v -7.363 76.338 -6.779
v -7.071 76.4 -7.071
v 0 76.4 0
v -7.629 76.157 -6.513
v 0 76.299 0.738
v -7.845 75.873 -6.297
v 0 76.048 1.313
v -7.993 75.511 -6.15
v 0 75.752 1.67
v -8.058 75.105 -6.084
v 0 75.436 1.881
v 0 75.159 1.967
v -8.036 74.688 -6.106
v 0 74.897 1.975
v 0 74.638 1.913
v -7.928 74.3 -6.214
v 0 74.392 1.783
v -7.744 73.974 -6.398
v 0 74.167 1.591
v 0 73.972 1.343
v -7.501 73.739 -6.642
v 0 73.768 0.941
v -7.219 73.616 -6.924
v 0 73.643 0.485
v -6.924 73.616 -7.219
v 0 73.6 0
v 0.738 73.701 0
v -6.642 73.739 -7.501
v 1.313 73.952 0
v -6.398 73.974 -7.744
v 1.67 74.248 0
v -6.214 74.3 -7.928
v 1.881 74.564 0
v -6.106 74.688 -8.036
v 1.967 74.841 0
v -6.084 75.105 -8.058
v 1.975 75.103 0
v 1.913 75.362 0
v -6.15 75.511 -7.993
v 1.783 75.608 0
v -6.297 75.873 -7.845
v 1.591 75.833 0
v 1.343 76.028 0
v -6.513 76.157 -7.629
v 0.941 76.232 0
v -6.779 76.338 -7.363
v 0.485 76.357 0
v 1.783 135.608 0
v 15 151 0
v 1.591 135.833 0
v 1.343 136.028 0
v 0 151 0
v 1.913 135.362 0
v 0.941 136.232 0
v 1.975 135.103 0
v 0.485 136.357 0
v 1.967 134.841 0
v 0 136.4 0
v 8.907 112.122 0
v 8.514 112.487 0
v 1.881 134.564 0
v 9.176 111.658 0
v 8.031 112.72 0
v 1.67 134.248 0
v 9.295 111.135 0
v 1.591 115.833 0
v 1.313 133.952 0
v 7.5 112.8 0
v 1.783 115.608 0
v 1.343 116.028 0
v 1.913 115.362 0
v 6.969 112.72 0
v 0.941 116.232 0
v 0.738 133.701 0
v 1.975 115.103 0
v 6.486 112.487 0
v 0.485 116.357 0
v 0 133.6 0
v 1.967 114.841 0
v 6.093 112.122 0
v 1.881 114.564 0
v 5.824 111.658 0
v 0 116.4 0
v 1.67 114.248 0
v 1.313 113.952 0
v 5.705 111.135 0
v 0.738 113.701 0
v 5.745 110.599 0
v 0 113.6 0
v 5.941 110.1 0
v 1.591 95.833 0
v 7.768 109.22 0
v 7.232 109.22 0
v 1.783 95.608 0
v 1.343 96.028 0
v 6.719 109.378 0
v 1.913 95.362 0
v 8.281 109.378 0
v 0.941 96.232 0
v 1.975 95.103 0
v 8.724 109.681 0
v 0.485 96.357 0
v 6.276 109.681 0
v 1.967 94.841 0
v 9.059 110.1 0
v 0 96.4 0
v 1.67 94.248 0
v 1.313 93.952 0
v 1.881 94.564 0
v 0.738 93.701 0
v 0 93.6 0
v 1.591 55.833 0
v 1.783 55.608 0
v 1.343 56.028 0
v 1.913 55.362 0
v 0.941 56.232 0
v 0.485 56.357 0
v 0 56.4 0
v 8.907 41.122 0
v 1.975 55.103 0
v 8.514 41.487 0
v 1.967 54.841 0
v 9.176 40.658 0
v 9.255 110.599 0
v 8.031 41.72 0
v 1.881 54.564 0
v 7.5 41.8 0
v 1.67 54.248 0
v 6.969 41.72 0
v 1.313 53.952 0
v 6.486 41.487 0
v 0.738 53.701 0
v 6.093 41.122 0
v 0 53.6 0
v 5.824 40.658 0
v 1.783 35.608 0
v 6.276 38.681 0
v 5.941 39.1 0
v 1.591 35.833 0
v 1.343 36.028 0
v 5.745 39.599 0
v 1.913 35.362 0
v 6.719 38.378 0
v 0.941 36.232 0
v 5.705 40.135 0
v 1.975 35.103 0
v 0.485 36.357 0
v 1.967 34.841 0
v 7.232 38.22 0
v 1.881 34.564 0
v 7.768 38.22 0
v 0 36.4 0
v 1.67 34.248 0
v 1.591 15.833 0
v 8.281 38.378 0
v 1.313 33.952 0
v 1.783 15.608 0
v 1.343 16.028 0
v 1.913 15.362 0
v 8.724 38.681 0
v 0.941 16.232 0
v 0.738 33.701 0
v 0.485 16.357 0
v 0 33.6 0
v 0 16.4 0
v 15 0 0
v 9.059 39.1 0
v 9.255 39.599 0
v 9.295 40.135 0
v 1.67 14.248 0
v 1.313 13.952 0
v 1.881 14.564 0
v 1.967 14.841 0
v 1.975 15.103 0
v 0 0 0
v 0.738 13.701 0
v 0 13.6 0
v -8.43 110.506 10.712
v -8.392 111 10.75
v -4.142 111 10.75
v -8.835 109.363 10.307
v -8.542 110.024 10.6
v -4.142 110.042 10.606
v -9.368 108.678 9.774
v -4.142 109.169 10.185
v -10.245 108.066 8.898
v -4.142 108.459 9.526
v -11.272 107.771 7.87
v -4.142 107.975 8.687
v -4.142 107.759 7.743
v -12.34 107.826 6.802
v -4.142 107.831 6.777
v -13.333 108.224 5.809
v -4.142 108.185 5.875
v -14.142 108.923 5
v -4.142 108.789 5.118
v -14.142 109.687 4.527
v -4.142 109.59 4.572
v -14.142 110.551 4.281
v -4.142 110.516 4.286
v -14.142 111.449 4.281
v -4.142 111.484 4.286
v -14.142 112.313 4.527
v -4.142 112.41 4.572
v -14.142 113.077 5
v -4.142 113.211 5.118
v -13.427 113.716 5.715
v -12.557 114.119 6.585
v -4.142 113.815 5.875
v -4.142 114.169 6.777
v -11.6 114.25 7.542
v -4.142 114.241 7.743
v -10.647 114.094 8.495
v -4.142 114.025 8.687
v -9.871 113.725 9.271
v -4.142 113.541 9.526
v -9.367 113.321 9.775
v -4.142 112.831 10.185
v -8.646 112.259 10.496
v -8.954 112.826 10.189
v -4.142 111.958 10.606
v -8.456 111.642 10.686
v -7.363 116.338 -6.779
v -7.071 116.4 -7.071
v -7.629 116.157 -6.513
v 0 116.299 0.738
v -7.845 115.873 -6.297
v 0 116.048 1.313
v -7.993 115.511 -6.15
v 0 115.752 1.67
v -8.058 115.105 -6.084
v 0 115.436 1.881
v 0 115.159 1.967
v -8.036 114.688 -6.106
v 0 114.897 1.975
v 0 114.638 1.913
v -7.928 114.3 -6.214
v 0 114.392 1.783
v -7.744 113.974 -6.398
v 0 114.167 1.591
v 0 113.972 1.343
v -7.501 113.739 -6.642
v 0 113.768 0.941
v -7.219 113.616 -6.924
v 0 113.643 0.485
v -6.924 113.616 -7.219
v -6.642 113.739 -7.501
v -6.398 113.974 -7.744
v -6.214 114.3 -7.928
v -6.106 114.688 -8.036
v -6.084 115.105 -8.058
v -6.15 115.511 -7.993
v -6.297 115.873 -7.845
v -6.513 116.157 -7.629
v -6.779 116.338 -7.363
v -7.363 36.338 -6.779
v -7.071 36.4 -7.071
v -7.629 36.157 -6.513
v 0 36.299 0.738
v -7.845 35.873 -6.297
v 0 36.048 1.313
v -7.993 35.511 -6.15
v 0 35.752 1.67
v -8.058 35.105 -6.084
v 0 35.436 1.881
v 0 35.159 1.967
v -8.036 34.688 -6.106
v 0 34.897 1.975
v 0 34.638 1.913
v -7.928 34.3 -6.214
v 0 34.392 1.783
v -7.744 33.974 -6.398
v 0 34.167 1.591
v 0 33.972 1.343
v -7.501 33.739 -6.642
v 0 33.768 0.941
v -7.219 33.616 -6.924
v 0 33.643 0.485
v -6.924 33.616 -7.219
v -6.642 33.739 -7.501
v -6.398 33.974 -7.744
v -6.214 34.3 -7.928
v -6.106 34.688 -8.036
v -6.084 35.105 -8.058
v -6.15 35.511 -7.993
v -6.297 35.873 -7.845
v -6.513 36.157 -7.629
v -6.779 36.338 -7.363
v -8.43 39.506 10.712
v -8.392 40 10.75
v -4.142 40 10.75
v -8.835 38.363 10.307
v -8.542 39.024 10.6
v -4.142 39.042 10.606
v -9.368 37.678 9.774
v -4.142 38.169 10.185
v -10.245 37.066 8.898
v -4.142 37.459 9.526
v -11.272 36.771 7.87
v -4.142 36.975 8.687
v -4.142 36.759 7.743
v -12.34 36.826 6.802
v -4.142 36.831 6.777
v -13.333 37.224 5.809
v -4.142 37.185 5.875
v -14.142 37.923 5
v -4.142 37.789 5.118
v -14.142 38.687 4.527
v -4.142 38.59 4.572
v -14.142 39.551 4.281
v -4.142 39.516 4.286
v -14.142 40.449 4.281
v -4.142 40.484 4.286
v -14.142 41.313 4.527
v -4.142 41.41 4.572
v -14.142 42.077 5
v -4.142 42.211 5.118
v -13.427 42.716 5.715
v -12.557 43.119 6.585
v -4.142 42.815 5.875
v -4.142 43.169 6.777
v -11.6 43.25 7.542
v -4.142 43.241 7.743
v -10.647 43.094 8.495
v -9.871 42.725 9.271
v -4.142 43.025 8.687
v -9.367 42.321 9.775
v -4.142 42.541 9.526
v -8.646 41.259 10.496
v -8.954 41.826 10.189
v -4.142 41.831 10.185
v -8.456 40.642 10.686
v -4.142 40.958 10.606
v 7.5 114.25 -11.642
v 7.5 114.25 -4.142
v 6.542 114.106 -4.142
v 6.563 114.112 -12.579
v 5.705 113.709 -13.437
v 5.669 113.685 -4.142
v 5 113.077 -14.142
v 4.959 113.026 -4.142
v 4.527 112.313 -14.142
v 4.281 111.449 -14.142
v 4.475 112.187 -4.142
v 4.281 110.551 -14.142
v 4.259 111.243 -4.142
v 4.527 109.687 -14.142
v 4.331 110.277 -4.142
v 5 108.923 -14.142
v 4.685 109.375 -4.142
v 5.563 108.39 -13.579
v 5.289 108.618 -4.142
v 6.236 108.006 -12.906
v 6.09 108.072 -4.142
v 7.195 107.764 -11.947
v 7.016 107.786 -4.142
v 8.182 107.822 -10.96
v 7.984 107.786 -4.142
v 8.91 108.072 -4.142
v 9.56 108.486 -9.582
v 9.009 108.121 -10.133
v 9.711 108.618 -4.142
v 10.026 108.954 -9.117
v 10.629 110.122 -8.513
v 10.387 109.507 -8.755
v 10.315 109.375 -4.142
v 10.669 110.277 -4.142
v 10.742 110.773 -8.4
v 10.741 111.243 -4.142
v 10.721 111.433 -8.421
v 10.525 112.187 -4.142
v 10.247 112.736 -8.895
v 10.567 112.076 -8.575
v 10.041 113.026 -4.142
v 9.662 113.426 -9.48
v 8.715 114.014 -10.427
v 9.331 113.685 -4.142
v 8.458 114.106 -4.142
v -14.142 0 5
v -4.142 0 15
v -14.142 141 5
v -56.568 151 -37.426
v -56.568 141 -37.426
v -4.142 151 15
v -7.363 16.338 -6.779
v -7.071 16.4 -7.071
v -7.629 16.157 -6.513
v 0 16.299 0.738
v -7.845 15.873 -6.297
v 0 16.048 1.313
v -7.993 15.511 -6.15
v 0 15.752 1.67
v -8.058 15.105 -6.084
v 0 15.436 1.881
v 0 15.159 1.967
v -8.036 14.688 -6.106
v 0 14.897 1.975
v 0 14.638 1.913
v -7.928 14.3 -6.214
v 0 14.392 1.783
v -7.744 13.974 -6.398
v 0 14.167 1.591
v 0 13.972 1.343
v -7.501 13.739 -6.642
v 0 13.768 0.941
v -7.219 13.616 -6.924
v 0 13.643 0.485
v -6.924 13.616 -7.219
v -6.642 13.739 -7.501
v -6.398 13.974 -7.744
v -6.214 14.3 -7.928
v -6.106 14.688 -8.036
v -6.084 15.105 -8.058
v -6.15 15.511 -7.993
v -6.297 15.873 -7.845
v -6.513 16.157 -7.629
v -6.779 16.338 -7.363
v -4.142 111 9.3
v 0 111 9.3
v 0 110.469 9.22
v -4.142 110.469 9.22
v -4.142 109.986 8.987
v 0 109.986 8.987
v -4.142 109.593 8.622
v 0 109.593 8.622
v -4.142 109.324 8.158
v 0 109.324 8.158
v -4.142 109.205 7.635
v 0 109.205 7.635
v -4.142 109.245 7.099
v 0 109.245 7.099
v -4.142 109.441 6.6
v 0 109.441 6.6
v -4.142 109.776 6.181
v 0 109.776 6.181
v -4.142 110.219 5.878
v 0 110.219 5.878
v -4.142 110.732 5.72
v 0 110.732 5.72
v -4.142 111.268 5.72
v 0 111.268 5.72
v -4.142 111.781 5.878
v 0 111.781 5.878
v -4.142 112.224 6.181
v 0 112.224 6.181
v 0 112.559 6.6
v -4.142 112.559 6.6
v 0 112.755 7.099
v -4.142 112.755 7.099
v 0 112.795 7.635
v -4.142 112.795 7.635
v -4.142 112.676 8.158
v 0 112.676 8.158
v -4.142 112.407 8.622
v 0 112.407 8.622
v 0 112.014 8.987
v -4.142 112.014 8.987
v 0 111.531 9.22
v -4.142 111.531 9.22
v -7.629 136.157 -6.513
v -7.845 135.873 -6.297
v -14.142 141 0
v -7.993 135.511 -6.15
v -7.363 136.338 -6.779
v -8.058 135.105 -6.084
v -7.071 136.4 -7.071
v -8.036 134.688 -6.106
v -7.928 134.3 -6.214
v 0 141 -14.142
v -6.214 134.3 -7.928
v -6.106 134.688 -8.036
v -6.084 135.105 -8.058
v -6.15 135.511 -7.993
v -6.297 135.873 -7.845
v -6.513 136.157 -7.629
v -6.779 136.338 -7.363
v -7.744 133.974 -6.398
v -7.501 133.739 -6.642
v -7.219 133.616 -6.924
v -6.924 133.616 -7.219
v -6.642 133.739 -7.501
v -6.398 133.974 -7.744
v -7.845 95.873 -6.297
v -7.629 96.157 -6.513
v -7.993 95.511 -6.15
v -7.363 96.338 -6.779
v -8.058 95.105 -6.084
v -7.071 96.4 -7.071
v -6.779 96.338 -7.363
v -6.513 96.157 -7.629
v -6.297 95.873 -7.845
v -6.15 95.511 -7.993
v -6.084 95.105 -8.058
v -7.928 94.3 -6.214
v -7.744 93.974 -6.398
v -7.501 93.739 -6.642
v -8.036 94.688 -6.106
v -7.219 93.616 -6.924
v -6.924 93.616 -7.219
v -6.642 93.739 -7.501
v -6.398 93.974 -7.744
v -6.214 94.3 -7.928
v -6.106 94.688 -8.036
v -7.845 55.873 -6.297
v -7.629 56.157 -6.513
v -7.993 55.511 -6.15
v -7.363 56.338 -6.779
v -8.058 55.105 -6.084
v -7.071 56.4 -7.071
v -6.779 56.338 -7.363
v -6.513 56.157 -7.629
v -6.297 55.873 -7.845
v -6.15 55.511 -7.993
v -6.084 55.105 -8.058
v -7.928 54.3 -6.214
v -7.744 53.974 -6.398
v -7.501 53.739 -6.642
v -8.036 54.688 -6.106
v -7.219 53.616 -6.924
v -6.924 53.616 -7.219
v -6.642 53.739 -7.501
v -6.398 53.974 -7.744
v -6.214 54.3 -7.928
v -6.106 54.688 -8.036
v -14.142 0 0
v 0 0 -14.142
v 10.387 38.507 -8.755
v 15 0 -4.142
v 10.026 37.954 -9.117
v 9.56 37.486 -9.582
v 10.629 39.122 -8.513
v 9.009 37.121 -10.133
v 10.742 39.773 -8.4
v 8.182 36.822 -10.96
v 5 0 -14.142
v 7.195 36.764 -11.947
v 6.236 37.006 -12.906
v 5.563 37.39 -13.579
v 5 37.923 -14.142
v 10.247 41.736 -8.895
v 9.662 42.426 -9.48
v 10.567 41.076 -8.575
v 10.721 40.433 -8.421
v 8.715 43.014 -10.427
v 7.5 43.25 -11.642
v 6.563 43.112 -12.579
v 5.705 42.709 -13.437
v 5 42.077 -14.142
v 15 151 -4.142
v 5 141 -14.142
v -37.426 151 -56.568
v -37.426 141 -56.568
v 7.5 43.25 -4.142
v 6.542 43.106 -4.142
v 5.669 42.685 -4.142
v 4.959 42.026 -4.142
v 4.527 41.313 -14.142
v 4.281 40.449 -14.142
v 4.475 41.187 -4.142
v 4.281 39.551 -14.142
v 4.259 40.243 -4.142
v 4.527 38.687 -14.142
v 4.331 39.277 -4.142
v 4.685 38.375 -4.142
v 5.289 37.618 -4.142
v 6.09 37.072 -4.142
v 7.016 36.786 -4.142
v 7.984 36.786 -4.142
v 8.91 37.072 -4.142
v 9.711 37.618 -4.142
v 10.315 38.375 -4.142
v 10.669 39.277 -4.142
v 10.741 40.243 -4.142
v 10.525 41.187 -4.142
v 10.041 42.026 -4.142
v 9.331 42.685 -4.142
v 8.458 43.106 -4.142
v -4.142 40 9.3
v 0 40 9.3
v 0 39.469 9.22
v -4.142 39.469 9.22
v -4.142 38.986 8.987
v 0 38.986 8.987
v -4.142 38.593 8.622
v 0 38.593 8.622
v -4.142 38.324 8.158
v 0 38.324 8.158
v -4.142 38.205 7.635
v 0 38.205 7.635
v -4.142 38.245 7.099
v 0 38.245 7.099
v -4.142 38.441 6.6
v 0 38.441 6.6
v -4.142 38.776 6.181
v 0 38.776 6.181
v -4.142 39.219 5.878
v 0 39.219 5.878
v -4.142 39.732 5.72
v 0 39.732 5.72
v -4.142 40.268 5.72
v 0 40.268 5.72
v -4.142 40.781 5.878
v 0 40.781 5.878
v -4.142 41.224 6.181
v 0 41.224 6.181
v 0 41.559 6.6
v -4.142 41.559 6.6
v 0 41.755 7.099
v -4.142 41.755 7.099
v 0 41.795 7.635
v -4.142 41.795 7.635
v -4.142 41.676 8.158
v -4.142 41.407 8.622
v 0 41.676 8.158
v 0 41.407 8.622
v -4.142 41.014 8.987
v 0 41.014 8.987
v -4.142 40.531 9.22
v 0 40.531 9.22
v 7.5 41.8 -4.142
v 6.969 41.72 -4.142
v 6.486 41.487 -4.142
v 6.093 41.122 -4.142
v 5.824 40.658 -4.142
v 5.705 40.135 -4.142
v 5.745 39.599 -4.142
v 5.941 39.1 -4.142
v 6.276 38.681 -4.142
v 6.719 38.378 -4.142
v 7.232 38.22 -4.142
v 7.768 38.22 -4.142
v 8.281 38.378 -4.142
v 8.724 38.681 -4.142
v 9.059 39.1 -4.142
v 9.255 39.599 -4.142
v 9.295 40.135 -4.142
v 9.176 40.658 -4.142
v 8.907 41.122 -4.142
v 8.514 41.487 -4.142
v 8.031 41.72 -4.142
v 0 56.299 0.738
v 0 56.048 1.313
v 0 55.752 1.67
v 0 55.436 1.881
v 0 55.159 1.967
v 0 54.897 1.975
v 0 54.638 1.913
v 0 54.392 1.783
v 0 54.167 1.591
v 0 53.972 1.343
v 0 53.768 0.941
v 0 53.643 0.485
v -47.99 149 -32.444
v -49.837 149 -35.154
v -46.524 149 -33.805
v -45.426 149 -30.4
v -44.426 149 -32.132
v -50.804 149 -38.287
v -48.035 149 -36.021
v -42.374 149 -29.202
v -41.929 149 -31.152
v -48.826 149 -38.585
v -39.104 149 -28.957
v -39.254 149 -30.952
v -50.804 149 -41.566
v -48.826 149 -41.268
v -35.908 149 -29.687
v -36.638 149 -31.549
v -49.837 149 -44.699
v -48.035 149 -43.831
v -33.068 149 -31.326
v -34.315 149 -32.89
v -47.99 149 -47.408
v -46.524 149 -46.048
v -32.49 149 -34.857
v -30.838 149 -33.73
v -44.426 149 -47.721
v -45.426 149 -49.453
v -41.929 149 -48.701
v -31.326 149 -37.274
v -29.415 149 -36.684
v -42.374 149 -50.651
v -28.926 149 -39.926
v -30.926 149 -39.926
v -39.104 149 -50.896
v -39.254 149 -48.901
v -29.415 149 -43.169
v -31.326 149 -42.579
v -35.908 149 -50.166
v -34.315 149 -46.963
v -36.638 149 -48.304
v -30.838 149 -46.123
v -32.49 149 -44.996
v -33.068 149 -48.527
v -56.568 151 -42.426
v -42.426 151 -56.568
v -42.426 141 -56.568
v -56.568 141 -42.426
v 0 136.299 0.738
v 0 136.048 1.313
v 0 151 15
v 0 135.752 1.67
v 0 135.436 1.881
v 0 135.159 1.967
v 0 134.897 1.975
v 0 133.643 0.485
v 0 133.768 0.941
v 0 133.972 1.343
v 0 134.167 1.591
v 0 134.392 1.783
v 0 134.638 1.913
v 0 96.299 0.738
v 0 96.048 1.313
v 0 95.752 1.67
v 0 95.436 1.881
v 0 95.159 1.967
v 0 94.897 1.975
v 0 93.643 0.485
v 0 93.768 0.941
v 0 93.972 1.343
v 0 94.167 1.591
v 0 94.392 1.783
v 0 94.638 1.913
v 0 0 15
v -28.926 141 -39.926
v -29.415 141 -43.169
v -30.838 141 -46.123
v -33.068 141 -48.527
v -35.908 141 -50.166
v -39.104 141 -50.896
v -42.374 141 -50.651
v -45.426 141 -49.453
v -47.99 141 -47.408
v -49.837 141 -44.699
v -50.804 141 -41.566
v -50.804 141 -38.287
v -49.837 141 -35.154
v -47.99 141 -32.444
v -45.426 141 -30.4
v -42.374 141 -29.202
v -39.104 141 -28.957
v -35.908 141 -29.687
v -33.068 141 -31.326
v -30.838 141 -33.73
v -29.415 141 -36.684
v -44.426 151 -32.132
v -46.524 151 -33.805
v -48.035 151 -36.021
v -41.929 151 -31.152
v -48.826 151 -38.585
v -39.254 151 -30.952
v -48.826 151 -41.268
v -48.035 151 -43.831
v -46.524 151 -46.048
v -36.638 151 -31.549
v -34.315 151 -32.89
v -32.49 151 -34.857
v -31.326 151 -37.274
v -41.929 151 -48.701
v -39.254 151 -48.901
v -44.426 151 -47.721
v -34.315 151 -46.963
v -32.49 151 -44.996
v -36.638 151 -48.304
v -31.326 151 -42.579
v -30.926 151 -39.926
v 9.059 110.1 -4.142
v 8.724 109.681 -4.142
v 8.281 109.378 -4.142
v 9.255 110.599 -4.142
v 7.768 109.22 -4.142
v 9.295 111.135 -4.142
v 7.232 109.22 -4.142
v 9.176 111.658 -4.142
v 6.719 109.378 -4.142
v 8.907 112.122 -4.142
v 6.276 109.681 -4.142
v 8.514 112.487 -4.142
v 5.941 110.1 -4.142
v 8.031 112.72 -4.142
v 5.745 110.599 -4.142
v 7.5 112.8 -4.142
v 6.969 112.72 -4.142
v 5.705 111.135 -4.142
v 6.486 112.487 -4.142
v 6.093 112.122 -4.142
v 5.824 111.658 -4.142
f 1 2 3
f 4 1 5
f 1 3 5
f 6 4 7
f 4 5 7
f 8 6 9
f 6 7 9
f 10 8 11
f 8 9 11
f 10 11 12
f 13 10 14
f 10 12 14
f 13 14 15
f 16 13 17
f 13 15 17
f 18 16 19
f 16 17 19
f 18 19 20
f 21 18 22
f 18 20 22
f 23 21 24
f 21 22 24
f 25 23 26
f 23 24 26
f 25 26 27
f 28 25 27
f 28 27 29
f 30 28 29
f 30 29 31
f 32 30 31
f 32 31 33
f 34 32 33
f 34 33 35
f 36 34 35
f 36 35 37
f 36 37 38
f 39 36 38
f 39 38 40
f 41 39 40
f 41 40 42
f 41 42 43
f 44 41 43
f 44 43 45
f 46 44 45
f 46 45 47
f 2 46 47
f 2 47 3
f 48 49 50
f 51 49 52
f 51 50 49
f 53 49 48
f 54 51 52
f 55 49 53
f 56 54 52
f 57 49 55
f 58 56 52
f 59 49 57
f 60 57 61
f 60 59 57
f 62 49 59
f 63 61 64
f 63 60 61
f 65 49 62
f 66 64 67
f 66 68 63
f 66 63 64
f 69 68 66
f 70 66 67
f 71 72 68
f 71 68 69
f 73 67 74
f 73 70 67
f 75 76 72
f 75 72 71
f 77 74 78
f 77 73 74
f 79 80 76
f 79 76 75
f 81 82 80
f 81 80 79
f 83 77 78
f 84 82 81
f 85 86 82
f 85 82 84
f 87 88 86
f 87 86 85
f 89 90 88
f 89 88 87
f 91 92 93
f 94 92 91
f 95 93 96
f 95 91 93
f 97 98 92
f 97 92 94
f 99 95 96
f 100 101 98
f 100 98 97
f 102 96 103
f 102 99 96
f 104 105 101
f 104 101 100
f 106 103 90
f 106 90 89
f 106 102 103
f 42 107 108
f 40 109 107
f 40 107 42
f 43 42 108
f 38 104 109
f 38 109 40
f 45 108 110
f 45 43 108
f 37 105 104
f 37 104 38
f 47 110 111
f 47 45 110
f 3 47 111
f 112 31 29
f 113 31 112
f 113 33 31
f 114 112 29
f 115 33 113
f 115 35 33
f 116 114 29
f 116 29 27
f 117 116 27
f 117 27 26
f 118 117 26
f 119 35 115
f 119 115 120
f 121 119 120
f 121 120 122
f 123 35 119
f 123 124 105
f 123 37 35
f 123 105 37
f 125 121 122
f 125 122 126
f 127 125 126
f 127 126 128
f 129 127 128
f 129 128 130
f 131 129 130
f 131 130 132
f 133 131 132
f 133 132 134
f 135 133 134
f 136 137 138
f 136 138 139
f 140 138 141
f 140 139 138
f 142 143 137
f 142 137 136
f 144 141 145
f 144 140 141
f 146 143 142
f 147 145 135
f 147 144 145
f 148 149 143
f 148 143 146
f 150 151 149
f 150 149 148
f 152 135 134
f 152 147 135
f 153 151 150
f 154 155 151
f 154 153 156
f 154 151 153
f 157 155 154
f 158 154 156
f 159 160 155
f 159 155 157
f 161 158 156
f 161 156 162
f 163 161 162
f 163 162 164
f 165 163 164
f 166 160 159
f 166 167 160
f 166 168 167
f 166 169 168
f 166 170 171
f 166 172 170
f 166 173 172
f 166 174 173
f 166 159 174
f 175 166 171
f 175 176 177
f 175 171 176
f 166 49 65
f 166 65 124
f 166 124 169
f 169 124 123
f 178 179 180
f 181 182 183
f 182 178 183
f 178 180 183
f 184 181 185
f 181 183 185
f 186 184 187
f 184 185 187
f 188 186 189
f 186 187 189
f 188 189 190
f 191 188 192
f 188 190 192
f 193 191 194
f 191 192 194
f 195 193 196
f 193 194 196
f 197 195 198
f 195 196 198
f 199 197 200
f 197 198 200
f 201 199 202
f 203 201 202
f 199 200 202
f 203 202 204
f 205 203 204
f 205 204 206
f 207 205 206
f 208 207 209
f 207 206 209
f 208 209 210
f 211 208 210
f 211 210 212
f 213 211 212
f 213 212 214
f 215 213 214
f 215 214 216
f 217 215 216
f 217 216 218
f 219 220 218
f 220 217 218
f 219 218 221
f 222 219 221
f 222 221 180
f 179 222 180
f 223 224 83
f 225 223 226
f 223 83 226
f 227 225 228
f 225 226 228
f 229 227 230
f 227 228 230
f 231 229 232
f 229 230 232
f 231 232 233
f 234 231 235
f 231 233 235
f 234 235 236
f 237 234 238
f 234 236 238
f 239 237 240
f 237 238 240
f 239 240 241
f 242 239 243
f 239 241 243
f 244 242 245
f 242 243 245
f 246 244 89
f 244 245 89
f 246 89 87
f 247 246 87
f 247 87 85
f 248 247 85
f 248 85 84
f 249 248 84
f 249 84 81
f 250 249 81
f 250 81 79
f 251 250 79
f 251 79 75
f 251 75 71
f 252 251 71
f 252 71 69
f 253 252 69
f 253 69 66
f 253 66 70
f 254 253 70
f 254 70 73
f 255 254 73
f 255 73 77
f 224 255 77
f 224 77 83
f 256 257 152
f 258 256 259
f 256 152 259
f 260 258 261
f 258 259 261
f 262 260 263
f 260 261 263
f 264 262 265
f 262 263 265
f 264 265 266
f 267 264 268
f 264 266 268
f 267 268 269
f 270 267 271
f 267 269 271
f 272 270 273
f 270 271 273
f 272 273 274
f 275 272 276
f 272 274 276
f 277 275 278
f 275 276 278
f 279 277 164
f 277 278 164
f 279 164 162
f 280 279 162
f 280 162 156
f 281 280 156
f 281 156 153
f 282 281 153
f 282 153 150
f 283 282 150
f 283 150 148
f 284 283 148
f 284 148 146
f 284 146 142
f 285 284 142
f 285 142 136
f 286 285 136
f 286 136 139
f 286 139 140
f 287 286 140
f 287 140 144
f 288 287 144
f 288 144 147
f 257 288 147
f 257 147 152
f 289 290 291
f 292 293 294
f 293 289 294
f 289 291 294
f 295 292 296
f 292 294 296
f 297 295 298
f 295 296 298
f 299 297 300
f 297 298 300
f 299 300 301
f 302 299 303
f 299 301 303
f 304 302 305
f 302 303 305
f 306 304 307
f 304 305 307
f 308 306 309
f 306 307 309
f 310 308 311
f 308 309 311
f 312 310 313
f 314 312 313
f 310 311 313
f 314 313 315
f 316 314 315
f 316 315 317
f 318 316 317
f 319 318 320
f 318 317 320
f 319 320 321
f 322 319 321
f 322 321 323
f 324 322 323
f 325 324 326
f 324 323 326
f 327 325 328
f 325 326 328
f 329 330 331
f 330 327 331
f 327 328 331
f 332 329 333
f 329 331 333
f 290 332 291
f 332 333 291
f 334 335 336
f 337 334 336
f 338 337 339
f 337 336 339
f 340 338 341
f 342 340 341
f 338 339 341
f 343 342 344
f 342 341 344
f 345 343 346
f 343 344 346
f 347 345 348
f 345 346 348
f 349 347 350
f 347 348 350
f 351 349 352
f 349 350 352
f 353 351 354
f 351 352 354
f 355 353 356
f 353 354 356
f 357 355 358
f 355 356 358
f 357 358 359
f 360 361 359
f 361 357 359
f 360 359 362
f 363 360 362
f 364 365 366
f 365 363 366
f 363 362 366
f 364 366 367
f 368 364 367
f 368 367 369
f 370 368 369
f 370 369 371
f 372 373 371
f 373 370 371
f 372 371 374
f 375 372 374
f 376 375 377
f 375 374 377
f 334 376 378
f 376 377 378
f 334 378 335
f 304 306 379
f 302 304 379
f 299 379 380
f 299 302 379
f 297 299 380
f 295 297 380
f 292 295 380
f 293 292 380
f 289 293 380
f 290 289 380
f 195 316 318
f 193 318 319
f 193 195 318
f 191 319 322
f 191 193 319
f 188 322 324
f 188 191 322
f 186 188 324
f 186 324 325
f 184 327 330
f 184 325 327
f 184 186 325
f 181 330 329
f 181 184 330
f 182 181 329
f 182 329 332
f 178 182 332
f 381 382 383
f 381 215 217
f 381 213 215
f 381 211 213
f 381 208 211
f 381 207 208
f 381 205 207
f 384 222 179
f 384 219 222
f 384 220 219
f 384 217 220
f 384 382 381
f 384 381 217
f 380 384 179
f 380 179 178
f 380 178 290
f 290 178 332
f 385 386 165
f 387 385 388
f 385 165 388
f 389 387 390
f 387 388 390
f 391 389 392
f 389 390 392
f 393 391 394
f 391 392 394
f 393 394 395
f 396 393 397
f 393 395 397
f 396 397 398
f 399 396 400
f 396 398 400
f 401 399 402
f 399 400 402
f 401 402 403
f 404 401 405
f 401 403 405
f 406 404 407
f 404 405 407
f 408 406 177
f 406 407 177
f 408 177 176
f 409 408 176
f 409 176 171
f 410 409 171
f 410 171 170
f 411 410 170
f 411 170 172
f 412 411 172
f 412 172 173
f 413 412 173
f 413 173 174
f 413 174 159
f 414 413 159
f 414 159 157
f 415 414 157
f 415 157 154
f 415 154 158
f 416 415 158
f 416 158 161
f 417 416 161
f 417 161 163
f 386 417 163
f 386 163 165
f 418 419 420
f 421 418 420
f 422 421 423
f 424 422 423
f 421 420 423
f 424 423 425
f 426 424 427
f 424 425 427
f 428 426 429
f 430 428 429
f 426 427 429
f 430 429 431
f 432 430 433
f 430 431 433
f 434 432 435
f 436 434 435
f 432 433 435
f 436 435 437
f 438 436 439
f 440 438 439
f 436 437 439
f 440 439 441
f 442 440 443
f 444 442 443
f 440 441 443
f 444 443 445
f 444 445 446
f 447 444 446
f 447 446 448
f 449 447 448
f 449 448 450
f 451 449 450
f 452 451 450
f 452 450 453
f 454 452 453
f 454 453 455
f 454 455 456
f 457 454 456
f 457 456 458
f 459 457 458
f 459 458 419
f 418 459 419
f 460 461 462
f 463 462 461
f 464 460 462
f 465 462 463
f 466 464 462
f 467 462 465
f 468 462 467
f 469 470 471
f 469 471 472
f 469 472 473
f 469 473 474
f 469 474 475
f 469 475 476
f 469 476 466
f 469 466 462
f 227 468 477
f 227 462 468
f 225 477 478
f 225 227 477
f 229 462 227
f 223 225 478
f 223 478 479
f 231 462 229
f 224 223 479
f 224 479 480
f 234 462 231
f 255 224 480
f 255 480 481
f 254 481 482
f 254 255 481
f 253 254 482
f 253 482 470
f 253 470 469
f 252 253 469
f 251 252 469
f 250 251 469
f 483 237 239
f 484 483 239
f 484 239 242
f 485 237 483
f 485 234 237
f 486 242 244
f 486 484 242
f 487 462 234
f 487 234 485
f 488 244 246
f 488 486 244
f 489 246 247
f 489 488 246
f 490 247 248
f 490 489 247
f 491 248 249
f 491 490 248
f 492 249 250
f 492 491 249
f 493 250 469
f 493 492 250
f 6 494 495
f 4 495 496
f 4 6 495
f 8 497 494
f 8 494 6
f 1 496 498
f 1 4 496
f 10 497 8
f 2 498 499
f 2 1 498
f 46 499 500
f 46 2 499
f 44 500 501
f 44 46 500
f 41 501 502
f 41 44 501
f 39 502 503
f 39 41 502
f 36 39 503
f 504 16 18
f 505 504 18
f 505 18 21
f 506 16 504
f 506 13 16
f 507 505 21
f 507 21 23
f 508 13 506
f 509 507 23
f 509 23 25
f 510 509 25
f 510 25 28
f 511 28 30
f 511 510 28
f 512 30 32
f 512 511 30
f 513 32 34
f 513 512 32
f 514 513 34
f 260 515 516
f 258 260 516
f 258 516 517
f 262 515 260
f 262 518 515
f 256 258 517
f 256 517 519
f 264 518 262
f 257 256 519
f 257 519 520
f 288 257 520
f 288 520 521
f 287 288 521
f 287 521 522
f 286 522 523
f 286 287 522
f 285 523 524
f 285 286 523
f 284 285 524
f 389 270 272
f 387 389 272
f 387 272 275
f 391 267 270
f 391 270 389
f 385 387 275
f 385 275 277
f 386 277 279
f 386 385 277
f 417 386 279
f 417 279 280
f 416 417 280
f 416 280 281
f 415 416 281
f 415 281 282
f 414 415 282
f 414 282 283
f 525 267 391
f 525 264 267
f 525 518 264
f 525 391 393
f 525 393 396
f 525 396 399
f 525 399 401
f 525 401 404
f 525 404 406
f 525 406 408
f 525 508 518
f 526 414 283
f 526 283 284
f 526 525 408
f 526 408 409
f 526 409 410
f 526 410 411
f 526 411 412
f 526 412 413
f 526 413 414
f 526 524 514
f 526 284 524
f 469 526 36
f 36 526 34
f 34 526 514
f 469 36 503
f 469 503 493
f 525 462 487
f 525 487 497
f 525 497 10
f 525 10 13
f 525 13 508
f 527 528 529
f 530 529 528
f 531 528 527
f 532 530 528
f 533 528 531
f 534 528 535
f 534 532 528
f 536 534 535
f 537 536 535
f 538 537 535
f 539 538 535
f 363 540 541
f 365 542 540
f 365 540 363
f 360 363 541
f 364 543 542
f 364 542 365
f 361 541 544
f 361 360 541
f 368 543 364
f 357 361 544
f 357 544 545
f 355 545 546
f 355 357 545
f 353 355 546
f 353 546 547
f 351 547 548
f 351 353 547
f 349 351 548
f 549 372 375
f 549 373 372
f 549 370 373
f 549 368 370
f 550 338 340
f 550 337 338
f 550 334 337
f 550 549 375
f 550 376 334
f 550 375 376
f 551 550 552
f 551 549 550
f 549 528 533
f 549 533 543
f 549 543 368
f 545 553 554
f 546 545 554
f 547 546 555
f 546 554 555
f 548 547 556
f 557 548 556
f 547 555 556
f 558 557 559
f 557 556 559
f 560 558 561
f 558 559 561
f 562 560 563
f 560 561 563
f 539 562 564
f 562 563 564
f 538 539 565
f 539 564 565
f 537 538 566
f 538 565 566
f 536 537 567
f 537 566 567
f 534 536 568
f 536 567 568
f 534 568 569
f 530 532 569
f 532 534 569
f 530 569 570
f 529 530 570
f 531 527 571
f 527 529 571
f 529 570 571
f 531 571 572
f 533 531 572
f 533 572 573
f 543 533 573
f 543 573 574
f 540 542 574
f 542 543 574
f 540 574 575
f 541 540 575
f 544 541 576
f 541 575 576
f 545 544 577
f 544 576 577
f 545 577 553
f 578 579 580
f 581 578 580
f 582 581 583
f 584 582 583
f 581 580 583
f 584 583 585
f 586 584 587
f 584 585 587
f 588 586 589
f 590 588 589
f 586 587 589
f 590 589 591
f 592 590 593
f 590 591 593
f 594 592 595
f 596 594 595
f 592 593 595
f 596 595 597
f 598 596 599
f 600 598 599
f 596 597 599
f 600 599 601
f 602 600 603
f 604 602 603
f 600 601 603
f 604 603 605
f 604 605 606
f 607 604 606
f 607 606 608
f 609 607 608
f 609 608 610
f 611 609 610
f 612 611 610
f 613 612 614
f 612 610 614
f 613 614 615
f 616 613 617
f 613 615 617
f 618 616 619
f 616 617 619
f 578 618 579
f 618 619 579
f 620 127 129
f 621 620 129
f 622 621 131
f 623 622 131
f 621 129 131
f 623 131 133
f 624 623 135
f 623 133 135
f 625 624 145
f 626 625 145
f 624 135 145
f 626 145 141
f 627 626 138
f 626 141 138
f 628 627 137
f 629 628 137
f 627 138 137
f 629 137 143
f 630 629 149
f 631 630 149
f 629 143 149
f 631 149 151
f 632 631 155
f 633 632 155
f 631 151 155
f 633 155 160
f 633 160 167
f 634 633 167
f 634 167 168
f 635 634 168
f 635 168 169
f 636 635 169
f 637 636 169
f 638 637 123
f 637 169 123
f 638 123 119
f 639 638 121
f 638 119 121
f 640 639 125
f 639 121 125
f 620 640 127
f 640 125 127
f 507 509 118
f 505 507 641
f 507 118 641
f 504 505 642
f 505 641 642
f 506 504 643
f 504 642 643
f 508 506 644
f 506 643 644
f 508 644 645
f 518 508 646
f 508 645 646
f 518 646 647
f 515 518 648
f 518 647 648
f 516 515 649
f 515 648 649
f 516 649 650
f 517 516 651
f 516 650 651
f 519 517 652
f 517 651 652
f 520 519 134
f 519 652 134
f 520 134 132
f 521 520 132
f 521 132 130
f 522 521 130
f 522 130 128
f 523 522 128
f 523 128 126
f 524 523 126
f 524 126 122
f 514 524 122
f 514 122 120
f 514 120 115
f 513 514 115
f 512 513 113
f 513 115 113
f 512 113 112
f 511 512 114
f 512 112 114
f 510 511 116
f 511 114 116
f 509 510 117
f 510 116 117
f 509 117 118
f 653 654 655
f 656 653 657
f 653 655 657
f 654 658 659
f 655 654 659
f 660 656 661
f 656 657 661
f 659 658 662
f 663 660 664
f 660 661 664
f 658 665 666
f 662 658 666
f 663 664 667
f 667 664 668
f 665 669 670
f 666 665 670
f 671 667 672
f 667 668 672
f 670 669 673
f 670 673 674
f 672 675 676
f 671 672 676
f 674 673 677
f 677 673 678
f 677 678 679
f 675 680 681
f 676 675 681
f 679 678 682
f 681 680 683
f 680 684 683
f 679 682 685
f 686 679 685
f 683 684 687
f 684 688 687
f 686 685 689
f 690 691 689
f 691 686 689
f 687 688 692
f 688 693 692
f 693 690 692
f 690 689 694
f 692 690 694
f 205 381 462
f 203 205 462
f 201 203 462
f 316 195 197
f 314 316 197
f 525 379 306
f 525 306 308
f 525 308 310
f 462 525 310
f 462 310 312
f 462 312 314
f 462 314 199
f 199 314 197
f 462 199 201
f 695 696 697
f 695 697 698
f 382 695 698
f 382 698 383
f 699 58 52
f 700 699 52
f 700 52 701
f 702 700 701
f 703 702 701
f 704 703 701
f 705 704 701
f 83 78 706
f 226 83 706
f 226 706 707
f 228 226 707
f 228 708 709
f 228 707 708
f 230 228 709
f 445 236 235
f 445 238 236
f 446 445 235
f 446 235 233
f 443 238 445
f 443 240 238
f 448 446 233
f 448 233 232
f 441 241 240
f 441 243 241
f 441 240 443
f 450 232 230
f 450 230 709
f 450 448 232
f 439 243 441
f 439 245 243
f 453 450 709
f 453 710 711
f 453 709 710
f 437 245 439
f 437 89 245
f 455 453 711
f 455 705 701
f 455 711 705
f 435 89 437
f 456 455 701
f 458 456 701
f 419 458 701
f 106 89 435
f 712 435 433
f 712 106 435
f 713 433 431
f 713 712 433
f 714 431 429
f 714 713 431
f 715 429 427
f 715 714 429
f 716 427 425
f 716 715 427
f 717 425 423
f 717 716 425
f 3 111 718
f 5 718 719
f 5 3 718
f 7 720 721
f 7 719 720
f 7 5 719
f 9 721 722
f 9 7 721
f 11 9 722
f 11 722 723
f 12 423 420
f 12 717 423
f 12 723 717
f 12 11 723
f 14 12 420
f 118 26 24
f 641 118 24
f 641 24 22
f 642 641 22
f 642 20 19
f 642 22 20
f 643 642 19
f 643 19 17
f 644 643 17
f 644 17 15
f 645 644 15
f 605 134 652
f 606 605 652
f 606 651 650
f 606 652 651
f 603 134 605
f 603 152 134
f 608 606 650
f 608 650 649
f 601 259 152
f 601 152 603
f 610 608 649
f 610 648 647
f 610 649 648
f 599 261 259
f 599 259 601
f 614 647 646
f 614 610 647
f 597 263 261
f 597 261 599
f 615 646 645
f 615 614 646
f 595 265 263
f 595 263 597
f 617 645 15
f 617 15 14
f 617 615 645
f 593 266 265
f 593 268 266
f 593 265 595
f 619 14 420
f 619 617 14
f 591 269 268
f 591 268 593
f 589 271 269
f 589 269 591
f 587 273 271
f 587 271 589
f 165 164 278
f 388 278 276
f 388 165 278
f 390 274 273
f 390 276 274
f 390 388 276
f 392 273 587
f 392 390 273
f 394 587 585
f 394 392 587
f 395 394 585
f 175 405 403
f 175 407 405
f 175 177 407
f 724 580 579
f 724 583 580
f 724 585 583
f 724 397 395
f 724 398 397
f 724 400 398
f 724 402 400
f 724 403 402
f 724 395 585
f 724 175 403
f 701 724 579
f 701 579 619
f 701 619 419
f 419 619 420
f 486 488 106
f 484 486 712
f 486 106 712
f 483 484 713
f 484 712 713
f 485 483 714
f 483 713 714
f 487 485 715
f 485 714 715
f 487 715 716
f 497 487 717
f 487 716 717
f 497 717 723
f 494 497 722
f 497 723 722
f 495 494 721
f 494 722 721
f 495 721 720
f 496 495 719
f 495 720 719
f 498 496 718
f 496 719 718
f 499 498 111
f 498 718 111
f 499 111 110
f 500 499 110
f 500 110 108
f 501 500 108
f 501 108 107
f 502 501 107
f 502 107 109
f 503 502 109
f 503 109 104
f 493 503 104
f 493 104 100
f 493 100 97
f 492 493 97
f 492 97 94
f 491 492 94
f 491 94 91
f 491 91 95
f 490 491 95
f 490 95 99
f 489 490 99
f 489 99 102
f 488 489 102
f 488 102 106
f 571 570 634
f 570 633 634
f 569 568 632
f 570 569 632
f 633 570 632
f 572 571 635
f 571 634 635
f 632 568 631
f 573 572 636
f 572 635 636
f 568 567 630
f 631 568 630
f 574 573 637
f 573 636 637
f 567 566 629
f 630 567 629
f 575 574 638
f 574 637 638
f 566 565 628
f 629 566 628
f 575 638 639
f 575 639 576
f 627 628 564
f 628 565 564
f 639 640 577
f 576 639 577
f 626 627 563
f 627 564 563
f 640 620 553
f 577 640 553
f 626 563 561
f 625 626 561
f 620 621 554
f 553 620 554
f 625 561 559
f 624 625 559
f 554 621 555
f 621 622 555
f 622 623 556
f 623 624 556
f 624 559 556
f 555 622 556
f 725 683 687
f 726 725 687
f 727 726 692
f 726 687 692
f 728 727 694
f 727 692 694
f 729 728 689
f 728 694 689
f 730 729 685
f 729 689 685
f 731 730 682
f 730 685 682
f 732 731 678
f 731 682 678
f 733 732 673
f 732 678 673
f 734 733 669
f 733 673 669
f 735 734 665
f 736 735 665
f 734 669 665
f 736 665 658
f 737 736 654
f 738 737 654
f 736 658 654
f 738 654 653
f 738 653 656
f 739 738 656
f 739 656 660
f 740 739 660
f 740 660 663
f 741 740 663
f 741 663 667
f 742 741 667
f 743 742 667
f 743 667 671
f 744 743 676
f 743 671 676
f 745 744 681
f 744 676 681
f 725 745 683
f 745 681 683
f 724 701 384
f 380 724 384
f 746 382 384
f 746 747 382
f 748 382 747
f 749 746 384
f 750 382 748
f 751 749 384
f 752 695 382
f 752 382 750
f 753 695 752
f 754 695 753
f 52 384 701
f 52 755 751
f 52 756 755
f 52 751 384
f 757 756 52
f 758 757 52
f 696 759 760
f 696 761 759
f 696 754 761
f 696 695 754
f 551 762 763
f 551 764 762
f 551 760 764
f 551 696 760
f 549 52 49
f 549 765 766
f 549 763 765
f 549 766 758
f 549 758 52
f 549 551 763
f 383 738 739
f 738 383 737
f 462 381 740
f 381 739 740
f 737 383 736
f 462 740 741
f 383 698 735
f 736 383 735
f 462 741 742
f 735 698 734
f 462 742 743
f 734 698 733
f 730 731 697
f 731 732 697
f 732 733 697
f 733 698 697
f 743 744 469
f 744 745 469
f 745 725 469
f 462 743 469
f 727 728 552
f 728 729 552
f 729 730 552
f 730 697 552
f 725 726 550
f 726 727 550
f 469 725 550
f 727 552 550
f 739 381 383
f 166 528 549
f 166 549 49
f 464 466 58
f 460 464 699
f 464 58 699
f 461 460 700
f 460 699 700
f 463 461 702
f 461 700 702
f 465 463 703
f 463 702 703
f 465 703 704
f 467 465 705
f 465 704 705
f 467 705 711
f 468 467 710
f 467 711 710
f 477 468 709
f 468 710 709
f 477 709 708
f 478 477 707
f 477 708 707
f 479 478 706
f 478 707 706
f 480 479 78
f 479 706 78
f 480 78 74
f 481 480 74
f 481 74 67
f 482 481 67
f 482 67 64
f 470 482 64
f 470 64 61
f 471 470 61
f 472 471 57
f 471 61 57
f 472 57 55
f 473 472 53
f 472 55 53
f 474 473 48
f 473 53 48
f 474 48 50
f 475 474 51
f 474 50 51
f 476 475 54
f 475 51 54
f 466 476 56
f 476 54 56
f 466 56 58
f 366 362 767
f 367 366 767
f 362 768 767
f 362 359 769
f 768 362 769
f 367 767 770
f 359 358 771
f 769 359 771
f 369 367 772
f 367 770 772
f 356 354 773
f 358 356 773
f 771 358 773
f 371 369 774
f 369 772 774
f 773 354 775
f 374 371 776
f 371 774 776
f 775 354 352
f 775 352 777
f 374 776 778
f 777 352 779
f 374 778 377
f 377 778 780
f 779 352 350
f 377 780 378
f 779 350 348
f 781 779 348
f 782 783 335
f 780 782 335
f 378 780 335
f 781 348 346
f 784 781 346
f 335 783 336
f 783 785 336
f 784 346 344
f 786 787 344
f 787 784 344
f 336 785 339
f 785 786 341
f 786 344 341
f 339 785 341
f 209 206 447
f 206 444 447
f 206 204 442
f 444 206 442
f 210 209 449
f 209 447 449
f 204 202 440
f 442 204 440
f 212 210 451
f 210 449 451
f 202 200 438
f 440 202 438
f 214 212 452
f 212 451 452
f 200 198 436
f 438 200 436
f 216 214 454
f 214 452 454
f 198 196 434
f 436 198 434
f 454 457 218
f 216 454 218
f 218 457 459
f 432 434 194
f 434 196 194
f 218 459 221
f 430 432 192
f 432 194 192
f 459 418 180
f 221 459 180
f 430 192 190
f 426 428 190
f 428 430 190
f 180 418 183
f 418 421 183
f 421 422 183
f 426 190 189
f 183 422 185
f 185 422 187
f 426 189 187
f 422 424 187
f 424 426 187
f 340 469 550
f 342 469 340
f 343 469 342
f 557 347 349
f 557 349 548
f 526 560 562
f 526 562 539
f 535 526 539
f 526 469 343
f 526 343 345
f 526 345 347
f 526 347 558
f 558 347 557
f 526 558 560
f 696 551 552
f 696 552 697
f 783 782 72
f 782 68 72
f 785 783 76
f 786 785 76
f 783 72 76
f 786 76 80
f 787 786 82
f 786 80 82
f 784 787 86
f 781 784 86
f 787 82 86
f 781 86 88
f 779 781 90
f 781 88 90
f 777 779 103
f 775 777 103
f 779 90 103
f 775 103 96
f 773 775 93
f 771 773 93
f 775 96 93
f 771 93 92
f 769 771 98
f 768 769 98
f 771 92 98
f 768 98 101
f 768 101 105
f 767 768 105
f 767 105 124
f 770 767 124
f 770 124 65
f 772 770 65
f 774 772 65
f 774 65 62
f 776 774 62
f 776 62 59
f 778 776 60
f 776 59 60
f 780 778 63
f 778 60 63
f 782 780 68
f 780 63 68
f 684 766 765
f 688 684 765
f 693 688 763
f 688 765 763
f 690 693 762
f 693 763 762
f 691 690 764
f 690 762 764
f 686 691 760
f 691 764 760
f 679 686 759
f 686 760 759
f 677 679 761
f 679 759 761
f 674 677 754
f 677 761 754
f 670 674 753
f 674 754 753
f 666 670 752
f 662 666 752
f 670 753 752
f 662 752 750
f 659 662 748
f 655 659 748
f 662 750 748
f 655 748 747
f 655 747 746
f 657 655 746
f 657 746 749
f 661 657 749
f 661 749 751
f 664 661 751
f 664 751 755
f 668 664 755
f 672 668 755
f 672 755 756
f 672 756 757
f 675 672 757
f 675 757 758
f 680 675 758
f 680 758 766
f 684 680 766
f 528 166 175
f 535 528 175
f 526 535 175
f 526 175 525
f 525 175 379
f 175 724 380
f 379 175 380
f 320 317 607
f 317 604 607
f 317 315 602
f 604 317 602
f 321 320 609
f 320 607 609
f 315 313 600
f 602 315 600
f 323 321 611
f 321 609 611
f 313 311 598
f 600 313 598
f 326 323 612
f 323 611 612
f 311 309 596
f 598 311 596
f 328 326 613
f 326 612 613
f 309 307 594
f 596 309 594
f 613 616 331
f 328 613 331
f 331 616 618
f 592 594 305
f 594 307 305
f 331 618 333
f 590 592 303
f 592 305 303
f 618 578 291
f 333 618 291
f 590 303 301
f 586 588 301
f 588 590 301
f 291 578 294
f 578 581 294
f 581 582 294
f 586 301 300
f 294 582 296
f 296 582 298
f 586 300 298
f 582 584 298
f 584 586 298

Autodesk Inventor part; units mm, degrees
ref_plane "YZ Plane" through (0, 0, 0) normal (1, 0, 0) x (0, 1, 0)
ref_plane "XZ Plane" through (0, 0, 0) normal (0, 1, 0) x (-1, 0, 0)
ref_plane "XY Plane" through (0, 0, 0) normal (0, 0, 1) x (1, 0, 0)
sketch "Sketch1" plane through (0, 0, 0) normal (0, 1, 0) x (-1, 0, 0)
  line L0 (0, 0) -> (0, 15)
  line L1 (0, 15) -> (14.1421, 15)
  line L2 (14.1421, 15) -> (14.1421, 0)
  line L3 (14.1421, 0) -> (0, -14.1421)
  line L4 (0, -14.1421) -> (-15, -14.1421)
  line L5 (-15, -14.1421) -> (-15, 0)
  line L6 (-15, 0) -> (0, 0)
  dimension "d0" = 15
  dimension "d1" = 10
extrude "Extrusion1" add sketch "Sketch1" along normal blind 151
chamfer "Chamfer1" distance 10 angle 45 2 edges at (-14.1421, 75.5, 15) (15, 75.5, -14.1421)
sketch "Sketch2" plane through (0, 151, 0) normal (0, 1, 0) x (1, 0, 0)
  line L0 (5, 14.1421) -> (15, 4.1421) projected
  line L1 (5, 14.1421) -> (0, 14.1421) projected
  line L2 (0, 14.1421) -> (-14.1421, 0) projected
  line L3 (-14.1421, 0) -> (-14.1421, -5) projected
  line L4 (-4.1421, -15) -> (-14.1421, -5) projected
  line L5 (-4.1421, -15) -> (0, -15) projected
  line L6 (0, -15) -> (0, 0) projected
  line L7 (0, 0) -> (15, 0) projected
  line L8 (15, 0) -> (15, 4.1421) projected
  circle A0 centre (-39.9264, 39.9264) radius 11
  line L9 (5, 14.1421) -> (-37.4264, 56.5685)
  line L10 (-37.4264, 56.5685) -> (-42.4264, 56.5685)
  line L11 (-42.4264, 56.5685) -> (-56.5685, 42.4264)
  line L12 (-56.5685, 42.4264) -> (-56.5685, 37.4264)
  line L13 (-56.5685, 37.4264) -> (-14.1421, -5)
  line L14 (-4.1421, -15) -> (-14.1421, -5) projected
  line L15 (5, 14.1421) -> (15, 4.1421) projected
  line L16 (-14.1421, 0) -> (-14.1421, -5) projected
  dimension "d7" = 22
  dimension "d8" = 60
  dimension "d9" = 27.0711
  dimension "d10" = 13.5355
  dimension "d11" = 13.5355
extrude "Extrusion2" add sketch "Sketch2" against normal blind 10 contours L1 L2 L3 L13 L12 L11 L10 L9
sketch "Sketch3" plane through (0, 151, 0) normal (0, 1, 0) x (1, 0, 0)
  circle A0 centre (-39.9264, 39.9264) radius 11 projected
  circle A1 centre (-39.9264, 39.9264) radius 9
  point P0 (0, 0)
  dimension "d14" = 2
extrude "Extrusion3" add sketch "Sketch3" against normal blind 2
sketch "Sketch4" plane through (-14.1421, 0, 0) normal (-1, 0, 0) x (0, 0, 1)
  line L0 (5, 141) -> (0, 141) projected
  line L1 (0, 0) -> (0, 141) projected
  line L2 (0, 0) -> (5, 0) projected
  line L3 (5, 141) -> (5, 0) projected
  line L4 (-37.4264, 151) -> (15, 151) projected
  line L5 (-37.4264, 151) -> (-37.4264, 141) projected
  line L6 (5, 141) -> (-37.4264, 141) projected
  line L7 (5, 141) -> (5, 0) projected
  line L8 (5, 0) -> (15, 0) projected
  line L9 (15, 0) -> (15, 151) projected
  point P0 (0, 0)
  point P1 (7.5, 40)
  point P2 (7.5, 111)
  dimension "d17" = 7.5
  dimension "d18" = 40
  dimension "d19" = 40
hole "Hole1" at (-14.1421, 40, 7.5) at (-14.1421, 111, 7.5) direction (1, 0, 0) diameter 3.6 end through all counterbore diameter 6.5 counterbore depth 10 clearance for "Hex Head Cap Screw ISO 24017" size "M3" standard "ISO"
sketch "Sketch5" plane through (5, 0, -14.1421) normal (0, 0, -1) x (-1, 0, 0)
  line L0 (5, 141) -> (0, 141) projected
  line L1 (0, 0) -> (0, 141) projected
  line L2 (0, 0) -> (5, 0) projected
  line L3 (5, 0) -> (5, 141) projected
  line L4 (-10, 151) -> (42.4264, 151) projected
  line L5 (-10, 151) -> (-10, 0) projected
  line L6 (-10, 0) -> (0, 0) projected
  line L7 (0, 0) -> (0, 141) projected
  line L8 (42.4264, 141) -> (0, 141) projected
  line L9 (42.4264, 151) -> (42.4264, 141) projected
  point P0 (-2.5, 40)
  point P1 (-2.5, 111)
  dimension "d27" = 7.5
  dimension "d28" = 40
  dimension "d29" = 40
hole "Hole2" at (7.5, 40, -14.1421) at (7.5, 111, -14.1421) direction (0, 0, 1) diameter 3.6 end through all counterbore diameter 6.5 counterbore depth 10 clearance for "Hex Head Cap Screw ISO 24017" size "M3" standard "ISO"
sketch "Sketch6" plane through (0, 0, -14.1421) normal (-0.7071, 0, -0.7071) x (-0.7071, 0, 0.7071)
  circle A0 centre (10, -125) radius 3 projected
  circle A1 centre (10, -85) radius 3 projected
  circle A2 centre (10, -45) radius 3 projected
  circle A3 centre (10, -5) radius 3 projected
  circle A4 centre (10, 35) radius 3 projected
  circle A5 centre (10, 75) radius 3 projected
  circle A6 centre (10, 115) radius 3 projected
  circle A7 centre (10, 135) radius 3 projected
  circle A8 centre (10, 95) radius 3 projected
  circle A9 centre (10, 55) radius 3 projected
  circle A10 centre (10, 15) radius 3 projected
  circle A11 centre (10, -25) radius 3 projected
  circle A12 centre (10, -65) radius 3 projected
  circle A13 centre (10, -105) radius 3 projected
  circle A14 centre (10, -145) radius 3 projected
  line L0 (14.5, 140) -> (5.5, 140) projected
  line L1 (5.5, 140) -> (5.5, -210) projected
  line L2 (14.5, -210) -> (5.5, -210) projected
  line L3 (14.5, 140) -> (14.5, -210) projected
  circle A15 centre (10, -205) radius 3 projected
  circle A16 centre (10, -165) radius 3 projected
  circle A17 centre (10, -185) radius 3 projected
  point P0 (10, 0)
hole "Hole3" at (-7.0711, 15, -7.0711) at (-7.0711, 35, -7.0711) at (-7.0711, 55, -7.0711) at (-7.0711, 75, -7.0711) at (-7.0711, 95, -7.0711) at (-7.0711, 115, -7.0711) at (-7.0711, 135, -7.0711) direction (0.7071, 0, 0.7071) diameter 2.8 end through all
equation "\"d10\" = 0.5 * d9"
equation "\"d11\" = d10"
equation "\"d19\" = d18"
equation "\"d29\" = d28"
properties part number "Corner Z Brace w Bearing" material "ABS Plastic"
